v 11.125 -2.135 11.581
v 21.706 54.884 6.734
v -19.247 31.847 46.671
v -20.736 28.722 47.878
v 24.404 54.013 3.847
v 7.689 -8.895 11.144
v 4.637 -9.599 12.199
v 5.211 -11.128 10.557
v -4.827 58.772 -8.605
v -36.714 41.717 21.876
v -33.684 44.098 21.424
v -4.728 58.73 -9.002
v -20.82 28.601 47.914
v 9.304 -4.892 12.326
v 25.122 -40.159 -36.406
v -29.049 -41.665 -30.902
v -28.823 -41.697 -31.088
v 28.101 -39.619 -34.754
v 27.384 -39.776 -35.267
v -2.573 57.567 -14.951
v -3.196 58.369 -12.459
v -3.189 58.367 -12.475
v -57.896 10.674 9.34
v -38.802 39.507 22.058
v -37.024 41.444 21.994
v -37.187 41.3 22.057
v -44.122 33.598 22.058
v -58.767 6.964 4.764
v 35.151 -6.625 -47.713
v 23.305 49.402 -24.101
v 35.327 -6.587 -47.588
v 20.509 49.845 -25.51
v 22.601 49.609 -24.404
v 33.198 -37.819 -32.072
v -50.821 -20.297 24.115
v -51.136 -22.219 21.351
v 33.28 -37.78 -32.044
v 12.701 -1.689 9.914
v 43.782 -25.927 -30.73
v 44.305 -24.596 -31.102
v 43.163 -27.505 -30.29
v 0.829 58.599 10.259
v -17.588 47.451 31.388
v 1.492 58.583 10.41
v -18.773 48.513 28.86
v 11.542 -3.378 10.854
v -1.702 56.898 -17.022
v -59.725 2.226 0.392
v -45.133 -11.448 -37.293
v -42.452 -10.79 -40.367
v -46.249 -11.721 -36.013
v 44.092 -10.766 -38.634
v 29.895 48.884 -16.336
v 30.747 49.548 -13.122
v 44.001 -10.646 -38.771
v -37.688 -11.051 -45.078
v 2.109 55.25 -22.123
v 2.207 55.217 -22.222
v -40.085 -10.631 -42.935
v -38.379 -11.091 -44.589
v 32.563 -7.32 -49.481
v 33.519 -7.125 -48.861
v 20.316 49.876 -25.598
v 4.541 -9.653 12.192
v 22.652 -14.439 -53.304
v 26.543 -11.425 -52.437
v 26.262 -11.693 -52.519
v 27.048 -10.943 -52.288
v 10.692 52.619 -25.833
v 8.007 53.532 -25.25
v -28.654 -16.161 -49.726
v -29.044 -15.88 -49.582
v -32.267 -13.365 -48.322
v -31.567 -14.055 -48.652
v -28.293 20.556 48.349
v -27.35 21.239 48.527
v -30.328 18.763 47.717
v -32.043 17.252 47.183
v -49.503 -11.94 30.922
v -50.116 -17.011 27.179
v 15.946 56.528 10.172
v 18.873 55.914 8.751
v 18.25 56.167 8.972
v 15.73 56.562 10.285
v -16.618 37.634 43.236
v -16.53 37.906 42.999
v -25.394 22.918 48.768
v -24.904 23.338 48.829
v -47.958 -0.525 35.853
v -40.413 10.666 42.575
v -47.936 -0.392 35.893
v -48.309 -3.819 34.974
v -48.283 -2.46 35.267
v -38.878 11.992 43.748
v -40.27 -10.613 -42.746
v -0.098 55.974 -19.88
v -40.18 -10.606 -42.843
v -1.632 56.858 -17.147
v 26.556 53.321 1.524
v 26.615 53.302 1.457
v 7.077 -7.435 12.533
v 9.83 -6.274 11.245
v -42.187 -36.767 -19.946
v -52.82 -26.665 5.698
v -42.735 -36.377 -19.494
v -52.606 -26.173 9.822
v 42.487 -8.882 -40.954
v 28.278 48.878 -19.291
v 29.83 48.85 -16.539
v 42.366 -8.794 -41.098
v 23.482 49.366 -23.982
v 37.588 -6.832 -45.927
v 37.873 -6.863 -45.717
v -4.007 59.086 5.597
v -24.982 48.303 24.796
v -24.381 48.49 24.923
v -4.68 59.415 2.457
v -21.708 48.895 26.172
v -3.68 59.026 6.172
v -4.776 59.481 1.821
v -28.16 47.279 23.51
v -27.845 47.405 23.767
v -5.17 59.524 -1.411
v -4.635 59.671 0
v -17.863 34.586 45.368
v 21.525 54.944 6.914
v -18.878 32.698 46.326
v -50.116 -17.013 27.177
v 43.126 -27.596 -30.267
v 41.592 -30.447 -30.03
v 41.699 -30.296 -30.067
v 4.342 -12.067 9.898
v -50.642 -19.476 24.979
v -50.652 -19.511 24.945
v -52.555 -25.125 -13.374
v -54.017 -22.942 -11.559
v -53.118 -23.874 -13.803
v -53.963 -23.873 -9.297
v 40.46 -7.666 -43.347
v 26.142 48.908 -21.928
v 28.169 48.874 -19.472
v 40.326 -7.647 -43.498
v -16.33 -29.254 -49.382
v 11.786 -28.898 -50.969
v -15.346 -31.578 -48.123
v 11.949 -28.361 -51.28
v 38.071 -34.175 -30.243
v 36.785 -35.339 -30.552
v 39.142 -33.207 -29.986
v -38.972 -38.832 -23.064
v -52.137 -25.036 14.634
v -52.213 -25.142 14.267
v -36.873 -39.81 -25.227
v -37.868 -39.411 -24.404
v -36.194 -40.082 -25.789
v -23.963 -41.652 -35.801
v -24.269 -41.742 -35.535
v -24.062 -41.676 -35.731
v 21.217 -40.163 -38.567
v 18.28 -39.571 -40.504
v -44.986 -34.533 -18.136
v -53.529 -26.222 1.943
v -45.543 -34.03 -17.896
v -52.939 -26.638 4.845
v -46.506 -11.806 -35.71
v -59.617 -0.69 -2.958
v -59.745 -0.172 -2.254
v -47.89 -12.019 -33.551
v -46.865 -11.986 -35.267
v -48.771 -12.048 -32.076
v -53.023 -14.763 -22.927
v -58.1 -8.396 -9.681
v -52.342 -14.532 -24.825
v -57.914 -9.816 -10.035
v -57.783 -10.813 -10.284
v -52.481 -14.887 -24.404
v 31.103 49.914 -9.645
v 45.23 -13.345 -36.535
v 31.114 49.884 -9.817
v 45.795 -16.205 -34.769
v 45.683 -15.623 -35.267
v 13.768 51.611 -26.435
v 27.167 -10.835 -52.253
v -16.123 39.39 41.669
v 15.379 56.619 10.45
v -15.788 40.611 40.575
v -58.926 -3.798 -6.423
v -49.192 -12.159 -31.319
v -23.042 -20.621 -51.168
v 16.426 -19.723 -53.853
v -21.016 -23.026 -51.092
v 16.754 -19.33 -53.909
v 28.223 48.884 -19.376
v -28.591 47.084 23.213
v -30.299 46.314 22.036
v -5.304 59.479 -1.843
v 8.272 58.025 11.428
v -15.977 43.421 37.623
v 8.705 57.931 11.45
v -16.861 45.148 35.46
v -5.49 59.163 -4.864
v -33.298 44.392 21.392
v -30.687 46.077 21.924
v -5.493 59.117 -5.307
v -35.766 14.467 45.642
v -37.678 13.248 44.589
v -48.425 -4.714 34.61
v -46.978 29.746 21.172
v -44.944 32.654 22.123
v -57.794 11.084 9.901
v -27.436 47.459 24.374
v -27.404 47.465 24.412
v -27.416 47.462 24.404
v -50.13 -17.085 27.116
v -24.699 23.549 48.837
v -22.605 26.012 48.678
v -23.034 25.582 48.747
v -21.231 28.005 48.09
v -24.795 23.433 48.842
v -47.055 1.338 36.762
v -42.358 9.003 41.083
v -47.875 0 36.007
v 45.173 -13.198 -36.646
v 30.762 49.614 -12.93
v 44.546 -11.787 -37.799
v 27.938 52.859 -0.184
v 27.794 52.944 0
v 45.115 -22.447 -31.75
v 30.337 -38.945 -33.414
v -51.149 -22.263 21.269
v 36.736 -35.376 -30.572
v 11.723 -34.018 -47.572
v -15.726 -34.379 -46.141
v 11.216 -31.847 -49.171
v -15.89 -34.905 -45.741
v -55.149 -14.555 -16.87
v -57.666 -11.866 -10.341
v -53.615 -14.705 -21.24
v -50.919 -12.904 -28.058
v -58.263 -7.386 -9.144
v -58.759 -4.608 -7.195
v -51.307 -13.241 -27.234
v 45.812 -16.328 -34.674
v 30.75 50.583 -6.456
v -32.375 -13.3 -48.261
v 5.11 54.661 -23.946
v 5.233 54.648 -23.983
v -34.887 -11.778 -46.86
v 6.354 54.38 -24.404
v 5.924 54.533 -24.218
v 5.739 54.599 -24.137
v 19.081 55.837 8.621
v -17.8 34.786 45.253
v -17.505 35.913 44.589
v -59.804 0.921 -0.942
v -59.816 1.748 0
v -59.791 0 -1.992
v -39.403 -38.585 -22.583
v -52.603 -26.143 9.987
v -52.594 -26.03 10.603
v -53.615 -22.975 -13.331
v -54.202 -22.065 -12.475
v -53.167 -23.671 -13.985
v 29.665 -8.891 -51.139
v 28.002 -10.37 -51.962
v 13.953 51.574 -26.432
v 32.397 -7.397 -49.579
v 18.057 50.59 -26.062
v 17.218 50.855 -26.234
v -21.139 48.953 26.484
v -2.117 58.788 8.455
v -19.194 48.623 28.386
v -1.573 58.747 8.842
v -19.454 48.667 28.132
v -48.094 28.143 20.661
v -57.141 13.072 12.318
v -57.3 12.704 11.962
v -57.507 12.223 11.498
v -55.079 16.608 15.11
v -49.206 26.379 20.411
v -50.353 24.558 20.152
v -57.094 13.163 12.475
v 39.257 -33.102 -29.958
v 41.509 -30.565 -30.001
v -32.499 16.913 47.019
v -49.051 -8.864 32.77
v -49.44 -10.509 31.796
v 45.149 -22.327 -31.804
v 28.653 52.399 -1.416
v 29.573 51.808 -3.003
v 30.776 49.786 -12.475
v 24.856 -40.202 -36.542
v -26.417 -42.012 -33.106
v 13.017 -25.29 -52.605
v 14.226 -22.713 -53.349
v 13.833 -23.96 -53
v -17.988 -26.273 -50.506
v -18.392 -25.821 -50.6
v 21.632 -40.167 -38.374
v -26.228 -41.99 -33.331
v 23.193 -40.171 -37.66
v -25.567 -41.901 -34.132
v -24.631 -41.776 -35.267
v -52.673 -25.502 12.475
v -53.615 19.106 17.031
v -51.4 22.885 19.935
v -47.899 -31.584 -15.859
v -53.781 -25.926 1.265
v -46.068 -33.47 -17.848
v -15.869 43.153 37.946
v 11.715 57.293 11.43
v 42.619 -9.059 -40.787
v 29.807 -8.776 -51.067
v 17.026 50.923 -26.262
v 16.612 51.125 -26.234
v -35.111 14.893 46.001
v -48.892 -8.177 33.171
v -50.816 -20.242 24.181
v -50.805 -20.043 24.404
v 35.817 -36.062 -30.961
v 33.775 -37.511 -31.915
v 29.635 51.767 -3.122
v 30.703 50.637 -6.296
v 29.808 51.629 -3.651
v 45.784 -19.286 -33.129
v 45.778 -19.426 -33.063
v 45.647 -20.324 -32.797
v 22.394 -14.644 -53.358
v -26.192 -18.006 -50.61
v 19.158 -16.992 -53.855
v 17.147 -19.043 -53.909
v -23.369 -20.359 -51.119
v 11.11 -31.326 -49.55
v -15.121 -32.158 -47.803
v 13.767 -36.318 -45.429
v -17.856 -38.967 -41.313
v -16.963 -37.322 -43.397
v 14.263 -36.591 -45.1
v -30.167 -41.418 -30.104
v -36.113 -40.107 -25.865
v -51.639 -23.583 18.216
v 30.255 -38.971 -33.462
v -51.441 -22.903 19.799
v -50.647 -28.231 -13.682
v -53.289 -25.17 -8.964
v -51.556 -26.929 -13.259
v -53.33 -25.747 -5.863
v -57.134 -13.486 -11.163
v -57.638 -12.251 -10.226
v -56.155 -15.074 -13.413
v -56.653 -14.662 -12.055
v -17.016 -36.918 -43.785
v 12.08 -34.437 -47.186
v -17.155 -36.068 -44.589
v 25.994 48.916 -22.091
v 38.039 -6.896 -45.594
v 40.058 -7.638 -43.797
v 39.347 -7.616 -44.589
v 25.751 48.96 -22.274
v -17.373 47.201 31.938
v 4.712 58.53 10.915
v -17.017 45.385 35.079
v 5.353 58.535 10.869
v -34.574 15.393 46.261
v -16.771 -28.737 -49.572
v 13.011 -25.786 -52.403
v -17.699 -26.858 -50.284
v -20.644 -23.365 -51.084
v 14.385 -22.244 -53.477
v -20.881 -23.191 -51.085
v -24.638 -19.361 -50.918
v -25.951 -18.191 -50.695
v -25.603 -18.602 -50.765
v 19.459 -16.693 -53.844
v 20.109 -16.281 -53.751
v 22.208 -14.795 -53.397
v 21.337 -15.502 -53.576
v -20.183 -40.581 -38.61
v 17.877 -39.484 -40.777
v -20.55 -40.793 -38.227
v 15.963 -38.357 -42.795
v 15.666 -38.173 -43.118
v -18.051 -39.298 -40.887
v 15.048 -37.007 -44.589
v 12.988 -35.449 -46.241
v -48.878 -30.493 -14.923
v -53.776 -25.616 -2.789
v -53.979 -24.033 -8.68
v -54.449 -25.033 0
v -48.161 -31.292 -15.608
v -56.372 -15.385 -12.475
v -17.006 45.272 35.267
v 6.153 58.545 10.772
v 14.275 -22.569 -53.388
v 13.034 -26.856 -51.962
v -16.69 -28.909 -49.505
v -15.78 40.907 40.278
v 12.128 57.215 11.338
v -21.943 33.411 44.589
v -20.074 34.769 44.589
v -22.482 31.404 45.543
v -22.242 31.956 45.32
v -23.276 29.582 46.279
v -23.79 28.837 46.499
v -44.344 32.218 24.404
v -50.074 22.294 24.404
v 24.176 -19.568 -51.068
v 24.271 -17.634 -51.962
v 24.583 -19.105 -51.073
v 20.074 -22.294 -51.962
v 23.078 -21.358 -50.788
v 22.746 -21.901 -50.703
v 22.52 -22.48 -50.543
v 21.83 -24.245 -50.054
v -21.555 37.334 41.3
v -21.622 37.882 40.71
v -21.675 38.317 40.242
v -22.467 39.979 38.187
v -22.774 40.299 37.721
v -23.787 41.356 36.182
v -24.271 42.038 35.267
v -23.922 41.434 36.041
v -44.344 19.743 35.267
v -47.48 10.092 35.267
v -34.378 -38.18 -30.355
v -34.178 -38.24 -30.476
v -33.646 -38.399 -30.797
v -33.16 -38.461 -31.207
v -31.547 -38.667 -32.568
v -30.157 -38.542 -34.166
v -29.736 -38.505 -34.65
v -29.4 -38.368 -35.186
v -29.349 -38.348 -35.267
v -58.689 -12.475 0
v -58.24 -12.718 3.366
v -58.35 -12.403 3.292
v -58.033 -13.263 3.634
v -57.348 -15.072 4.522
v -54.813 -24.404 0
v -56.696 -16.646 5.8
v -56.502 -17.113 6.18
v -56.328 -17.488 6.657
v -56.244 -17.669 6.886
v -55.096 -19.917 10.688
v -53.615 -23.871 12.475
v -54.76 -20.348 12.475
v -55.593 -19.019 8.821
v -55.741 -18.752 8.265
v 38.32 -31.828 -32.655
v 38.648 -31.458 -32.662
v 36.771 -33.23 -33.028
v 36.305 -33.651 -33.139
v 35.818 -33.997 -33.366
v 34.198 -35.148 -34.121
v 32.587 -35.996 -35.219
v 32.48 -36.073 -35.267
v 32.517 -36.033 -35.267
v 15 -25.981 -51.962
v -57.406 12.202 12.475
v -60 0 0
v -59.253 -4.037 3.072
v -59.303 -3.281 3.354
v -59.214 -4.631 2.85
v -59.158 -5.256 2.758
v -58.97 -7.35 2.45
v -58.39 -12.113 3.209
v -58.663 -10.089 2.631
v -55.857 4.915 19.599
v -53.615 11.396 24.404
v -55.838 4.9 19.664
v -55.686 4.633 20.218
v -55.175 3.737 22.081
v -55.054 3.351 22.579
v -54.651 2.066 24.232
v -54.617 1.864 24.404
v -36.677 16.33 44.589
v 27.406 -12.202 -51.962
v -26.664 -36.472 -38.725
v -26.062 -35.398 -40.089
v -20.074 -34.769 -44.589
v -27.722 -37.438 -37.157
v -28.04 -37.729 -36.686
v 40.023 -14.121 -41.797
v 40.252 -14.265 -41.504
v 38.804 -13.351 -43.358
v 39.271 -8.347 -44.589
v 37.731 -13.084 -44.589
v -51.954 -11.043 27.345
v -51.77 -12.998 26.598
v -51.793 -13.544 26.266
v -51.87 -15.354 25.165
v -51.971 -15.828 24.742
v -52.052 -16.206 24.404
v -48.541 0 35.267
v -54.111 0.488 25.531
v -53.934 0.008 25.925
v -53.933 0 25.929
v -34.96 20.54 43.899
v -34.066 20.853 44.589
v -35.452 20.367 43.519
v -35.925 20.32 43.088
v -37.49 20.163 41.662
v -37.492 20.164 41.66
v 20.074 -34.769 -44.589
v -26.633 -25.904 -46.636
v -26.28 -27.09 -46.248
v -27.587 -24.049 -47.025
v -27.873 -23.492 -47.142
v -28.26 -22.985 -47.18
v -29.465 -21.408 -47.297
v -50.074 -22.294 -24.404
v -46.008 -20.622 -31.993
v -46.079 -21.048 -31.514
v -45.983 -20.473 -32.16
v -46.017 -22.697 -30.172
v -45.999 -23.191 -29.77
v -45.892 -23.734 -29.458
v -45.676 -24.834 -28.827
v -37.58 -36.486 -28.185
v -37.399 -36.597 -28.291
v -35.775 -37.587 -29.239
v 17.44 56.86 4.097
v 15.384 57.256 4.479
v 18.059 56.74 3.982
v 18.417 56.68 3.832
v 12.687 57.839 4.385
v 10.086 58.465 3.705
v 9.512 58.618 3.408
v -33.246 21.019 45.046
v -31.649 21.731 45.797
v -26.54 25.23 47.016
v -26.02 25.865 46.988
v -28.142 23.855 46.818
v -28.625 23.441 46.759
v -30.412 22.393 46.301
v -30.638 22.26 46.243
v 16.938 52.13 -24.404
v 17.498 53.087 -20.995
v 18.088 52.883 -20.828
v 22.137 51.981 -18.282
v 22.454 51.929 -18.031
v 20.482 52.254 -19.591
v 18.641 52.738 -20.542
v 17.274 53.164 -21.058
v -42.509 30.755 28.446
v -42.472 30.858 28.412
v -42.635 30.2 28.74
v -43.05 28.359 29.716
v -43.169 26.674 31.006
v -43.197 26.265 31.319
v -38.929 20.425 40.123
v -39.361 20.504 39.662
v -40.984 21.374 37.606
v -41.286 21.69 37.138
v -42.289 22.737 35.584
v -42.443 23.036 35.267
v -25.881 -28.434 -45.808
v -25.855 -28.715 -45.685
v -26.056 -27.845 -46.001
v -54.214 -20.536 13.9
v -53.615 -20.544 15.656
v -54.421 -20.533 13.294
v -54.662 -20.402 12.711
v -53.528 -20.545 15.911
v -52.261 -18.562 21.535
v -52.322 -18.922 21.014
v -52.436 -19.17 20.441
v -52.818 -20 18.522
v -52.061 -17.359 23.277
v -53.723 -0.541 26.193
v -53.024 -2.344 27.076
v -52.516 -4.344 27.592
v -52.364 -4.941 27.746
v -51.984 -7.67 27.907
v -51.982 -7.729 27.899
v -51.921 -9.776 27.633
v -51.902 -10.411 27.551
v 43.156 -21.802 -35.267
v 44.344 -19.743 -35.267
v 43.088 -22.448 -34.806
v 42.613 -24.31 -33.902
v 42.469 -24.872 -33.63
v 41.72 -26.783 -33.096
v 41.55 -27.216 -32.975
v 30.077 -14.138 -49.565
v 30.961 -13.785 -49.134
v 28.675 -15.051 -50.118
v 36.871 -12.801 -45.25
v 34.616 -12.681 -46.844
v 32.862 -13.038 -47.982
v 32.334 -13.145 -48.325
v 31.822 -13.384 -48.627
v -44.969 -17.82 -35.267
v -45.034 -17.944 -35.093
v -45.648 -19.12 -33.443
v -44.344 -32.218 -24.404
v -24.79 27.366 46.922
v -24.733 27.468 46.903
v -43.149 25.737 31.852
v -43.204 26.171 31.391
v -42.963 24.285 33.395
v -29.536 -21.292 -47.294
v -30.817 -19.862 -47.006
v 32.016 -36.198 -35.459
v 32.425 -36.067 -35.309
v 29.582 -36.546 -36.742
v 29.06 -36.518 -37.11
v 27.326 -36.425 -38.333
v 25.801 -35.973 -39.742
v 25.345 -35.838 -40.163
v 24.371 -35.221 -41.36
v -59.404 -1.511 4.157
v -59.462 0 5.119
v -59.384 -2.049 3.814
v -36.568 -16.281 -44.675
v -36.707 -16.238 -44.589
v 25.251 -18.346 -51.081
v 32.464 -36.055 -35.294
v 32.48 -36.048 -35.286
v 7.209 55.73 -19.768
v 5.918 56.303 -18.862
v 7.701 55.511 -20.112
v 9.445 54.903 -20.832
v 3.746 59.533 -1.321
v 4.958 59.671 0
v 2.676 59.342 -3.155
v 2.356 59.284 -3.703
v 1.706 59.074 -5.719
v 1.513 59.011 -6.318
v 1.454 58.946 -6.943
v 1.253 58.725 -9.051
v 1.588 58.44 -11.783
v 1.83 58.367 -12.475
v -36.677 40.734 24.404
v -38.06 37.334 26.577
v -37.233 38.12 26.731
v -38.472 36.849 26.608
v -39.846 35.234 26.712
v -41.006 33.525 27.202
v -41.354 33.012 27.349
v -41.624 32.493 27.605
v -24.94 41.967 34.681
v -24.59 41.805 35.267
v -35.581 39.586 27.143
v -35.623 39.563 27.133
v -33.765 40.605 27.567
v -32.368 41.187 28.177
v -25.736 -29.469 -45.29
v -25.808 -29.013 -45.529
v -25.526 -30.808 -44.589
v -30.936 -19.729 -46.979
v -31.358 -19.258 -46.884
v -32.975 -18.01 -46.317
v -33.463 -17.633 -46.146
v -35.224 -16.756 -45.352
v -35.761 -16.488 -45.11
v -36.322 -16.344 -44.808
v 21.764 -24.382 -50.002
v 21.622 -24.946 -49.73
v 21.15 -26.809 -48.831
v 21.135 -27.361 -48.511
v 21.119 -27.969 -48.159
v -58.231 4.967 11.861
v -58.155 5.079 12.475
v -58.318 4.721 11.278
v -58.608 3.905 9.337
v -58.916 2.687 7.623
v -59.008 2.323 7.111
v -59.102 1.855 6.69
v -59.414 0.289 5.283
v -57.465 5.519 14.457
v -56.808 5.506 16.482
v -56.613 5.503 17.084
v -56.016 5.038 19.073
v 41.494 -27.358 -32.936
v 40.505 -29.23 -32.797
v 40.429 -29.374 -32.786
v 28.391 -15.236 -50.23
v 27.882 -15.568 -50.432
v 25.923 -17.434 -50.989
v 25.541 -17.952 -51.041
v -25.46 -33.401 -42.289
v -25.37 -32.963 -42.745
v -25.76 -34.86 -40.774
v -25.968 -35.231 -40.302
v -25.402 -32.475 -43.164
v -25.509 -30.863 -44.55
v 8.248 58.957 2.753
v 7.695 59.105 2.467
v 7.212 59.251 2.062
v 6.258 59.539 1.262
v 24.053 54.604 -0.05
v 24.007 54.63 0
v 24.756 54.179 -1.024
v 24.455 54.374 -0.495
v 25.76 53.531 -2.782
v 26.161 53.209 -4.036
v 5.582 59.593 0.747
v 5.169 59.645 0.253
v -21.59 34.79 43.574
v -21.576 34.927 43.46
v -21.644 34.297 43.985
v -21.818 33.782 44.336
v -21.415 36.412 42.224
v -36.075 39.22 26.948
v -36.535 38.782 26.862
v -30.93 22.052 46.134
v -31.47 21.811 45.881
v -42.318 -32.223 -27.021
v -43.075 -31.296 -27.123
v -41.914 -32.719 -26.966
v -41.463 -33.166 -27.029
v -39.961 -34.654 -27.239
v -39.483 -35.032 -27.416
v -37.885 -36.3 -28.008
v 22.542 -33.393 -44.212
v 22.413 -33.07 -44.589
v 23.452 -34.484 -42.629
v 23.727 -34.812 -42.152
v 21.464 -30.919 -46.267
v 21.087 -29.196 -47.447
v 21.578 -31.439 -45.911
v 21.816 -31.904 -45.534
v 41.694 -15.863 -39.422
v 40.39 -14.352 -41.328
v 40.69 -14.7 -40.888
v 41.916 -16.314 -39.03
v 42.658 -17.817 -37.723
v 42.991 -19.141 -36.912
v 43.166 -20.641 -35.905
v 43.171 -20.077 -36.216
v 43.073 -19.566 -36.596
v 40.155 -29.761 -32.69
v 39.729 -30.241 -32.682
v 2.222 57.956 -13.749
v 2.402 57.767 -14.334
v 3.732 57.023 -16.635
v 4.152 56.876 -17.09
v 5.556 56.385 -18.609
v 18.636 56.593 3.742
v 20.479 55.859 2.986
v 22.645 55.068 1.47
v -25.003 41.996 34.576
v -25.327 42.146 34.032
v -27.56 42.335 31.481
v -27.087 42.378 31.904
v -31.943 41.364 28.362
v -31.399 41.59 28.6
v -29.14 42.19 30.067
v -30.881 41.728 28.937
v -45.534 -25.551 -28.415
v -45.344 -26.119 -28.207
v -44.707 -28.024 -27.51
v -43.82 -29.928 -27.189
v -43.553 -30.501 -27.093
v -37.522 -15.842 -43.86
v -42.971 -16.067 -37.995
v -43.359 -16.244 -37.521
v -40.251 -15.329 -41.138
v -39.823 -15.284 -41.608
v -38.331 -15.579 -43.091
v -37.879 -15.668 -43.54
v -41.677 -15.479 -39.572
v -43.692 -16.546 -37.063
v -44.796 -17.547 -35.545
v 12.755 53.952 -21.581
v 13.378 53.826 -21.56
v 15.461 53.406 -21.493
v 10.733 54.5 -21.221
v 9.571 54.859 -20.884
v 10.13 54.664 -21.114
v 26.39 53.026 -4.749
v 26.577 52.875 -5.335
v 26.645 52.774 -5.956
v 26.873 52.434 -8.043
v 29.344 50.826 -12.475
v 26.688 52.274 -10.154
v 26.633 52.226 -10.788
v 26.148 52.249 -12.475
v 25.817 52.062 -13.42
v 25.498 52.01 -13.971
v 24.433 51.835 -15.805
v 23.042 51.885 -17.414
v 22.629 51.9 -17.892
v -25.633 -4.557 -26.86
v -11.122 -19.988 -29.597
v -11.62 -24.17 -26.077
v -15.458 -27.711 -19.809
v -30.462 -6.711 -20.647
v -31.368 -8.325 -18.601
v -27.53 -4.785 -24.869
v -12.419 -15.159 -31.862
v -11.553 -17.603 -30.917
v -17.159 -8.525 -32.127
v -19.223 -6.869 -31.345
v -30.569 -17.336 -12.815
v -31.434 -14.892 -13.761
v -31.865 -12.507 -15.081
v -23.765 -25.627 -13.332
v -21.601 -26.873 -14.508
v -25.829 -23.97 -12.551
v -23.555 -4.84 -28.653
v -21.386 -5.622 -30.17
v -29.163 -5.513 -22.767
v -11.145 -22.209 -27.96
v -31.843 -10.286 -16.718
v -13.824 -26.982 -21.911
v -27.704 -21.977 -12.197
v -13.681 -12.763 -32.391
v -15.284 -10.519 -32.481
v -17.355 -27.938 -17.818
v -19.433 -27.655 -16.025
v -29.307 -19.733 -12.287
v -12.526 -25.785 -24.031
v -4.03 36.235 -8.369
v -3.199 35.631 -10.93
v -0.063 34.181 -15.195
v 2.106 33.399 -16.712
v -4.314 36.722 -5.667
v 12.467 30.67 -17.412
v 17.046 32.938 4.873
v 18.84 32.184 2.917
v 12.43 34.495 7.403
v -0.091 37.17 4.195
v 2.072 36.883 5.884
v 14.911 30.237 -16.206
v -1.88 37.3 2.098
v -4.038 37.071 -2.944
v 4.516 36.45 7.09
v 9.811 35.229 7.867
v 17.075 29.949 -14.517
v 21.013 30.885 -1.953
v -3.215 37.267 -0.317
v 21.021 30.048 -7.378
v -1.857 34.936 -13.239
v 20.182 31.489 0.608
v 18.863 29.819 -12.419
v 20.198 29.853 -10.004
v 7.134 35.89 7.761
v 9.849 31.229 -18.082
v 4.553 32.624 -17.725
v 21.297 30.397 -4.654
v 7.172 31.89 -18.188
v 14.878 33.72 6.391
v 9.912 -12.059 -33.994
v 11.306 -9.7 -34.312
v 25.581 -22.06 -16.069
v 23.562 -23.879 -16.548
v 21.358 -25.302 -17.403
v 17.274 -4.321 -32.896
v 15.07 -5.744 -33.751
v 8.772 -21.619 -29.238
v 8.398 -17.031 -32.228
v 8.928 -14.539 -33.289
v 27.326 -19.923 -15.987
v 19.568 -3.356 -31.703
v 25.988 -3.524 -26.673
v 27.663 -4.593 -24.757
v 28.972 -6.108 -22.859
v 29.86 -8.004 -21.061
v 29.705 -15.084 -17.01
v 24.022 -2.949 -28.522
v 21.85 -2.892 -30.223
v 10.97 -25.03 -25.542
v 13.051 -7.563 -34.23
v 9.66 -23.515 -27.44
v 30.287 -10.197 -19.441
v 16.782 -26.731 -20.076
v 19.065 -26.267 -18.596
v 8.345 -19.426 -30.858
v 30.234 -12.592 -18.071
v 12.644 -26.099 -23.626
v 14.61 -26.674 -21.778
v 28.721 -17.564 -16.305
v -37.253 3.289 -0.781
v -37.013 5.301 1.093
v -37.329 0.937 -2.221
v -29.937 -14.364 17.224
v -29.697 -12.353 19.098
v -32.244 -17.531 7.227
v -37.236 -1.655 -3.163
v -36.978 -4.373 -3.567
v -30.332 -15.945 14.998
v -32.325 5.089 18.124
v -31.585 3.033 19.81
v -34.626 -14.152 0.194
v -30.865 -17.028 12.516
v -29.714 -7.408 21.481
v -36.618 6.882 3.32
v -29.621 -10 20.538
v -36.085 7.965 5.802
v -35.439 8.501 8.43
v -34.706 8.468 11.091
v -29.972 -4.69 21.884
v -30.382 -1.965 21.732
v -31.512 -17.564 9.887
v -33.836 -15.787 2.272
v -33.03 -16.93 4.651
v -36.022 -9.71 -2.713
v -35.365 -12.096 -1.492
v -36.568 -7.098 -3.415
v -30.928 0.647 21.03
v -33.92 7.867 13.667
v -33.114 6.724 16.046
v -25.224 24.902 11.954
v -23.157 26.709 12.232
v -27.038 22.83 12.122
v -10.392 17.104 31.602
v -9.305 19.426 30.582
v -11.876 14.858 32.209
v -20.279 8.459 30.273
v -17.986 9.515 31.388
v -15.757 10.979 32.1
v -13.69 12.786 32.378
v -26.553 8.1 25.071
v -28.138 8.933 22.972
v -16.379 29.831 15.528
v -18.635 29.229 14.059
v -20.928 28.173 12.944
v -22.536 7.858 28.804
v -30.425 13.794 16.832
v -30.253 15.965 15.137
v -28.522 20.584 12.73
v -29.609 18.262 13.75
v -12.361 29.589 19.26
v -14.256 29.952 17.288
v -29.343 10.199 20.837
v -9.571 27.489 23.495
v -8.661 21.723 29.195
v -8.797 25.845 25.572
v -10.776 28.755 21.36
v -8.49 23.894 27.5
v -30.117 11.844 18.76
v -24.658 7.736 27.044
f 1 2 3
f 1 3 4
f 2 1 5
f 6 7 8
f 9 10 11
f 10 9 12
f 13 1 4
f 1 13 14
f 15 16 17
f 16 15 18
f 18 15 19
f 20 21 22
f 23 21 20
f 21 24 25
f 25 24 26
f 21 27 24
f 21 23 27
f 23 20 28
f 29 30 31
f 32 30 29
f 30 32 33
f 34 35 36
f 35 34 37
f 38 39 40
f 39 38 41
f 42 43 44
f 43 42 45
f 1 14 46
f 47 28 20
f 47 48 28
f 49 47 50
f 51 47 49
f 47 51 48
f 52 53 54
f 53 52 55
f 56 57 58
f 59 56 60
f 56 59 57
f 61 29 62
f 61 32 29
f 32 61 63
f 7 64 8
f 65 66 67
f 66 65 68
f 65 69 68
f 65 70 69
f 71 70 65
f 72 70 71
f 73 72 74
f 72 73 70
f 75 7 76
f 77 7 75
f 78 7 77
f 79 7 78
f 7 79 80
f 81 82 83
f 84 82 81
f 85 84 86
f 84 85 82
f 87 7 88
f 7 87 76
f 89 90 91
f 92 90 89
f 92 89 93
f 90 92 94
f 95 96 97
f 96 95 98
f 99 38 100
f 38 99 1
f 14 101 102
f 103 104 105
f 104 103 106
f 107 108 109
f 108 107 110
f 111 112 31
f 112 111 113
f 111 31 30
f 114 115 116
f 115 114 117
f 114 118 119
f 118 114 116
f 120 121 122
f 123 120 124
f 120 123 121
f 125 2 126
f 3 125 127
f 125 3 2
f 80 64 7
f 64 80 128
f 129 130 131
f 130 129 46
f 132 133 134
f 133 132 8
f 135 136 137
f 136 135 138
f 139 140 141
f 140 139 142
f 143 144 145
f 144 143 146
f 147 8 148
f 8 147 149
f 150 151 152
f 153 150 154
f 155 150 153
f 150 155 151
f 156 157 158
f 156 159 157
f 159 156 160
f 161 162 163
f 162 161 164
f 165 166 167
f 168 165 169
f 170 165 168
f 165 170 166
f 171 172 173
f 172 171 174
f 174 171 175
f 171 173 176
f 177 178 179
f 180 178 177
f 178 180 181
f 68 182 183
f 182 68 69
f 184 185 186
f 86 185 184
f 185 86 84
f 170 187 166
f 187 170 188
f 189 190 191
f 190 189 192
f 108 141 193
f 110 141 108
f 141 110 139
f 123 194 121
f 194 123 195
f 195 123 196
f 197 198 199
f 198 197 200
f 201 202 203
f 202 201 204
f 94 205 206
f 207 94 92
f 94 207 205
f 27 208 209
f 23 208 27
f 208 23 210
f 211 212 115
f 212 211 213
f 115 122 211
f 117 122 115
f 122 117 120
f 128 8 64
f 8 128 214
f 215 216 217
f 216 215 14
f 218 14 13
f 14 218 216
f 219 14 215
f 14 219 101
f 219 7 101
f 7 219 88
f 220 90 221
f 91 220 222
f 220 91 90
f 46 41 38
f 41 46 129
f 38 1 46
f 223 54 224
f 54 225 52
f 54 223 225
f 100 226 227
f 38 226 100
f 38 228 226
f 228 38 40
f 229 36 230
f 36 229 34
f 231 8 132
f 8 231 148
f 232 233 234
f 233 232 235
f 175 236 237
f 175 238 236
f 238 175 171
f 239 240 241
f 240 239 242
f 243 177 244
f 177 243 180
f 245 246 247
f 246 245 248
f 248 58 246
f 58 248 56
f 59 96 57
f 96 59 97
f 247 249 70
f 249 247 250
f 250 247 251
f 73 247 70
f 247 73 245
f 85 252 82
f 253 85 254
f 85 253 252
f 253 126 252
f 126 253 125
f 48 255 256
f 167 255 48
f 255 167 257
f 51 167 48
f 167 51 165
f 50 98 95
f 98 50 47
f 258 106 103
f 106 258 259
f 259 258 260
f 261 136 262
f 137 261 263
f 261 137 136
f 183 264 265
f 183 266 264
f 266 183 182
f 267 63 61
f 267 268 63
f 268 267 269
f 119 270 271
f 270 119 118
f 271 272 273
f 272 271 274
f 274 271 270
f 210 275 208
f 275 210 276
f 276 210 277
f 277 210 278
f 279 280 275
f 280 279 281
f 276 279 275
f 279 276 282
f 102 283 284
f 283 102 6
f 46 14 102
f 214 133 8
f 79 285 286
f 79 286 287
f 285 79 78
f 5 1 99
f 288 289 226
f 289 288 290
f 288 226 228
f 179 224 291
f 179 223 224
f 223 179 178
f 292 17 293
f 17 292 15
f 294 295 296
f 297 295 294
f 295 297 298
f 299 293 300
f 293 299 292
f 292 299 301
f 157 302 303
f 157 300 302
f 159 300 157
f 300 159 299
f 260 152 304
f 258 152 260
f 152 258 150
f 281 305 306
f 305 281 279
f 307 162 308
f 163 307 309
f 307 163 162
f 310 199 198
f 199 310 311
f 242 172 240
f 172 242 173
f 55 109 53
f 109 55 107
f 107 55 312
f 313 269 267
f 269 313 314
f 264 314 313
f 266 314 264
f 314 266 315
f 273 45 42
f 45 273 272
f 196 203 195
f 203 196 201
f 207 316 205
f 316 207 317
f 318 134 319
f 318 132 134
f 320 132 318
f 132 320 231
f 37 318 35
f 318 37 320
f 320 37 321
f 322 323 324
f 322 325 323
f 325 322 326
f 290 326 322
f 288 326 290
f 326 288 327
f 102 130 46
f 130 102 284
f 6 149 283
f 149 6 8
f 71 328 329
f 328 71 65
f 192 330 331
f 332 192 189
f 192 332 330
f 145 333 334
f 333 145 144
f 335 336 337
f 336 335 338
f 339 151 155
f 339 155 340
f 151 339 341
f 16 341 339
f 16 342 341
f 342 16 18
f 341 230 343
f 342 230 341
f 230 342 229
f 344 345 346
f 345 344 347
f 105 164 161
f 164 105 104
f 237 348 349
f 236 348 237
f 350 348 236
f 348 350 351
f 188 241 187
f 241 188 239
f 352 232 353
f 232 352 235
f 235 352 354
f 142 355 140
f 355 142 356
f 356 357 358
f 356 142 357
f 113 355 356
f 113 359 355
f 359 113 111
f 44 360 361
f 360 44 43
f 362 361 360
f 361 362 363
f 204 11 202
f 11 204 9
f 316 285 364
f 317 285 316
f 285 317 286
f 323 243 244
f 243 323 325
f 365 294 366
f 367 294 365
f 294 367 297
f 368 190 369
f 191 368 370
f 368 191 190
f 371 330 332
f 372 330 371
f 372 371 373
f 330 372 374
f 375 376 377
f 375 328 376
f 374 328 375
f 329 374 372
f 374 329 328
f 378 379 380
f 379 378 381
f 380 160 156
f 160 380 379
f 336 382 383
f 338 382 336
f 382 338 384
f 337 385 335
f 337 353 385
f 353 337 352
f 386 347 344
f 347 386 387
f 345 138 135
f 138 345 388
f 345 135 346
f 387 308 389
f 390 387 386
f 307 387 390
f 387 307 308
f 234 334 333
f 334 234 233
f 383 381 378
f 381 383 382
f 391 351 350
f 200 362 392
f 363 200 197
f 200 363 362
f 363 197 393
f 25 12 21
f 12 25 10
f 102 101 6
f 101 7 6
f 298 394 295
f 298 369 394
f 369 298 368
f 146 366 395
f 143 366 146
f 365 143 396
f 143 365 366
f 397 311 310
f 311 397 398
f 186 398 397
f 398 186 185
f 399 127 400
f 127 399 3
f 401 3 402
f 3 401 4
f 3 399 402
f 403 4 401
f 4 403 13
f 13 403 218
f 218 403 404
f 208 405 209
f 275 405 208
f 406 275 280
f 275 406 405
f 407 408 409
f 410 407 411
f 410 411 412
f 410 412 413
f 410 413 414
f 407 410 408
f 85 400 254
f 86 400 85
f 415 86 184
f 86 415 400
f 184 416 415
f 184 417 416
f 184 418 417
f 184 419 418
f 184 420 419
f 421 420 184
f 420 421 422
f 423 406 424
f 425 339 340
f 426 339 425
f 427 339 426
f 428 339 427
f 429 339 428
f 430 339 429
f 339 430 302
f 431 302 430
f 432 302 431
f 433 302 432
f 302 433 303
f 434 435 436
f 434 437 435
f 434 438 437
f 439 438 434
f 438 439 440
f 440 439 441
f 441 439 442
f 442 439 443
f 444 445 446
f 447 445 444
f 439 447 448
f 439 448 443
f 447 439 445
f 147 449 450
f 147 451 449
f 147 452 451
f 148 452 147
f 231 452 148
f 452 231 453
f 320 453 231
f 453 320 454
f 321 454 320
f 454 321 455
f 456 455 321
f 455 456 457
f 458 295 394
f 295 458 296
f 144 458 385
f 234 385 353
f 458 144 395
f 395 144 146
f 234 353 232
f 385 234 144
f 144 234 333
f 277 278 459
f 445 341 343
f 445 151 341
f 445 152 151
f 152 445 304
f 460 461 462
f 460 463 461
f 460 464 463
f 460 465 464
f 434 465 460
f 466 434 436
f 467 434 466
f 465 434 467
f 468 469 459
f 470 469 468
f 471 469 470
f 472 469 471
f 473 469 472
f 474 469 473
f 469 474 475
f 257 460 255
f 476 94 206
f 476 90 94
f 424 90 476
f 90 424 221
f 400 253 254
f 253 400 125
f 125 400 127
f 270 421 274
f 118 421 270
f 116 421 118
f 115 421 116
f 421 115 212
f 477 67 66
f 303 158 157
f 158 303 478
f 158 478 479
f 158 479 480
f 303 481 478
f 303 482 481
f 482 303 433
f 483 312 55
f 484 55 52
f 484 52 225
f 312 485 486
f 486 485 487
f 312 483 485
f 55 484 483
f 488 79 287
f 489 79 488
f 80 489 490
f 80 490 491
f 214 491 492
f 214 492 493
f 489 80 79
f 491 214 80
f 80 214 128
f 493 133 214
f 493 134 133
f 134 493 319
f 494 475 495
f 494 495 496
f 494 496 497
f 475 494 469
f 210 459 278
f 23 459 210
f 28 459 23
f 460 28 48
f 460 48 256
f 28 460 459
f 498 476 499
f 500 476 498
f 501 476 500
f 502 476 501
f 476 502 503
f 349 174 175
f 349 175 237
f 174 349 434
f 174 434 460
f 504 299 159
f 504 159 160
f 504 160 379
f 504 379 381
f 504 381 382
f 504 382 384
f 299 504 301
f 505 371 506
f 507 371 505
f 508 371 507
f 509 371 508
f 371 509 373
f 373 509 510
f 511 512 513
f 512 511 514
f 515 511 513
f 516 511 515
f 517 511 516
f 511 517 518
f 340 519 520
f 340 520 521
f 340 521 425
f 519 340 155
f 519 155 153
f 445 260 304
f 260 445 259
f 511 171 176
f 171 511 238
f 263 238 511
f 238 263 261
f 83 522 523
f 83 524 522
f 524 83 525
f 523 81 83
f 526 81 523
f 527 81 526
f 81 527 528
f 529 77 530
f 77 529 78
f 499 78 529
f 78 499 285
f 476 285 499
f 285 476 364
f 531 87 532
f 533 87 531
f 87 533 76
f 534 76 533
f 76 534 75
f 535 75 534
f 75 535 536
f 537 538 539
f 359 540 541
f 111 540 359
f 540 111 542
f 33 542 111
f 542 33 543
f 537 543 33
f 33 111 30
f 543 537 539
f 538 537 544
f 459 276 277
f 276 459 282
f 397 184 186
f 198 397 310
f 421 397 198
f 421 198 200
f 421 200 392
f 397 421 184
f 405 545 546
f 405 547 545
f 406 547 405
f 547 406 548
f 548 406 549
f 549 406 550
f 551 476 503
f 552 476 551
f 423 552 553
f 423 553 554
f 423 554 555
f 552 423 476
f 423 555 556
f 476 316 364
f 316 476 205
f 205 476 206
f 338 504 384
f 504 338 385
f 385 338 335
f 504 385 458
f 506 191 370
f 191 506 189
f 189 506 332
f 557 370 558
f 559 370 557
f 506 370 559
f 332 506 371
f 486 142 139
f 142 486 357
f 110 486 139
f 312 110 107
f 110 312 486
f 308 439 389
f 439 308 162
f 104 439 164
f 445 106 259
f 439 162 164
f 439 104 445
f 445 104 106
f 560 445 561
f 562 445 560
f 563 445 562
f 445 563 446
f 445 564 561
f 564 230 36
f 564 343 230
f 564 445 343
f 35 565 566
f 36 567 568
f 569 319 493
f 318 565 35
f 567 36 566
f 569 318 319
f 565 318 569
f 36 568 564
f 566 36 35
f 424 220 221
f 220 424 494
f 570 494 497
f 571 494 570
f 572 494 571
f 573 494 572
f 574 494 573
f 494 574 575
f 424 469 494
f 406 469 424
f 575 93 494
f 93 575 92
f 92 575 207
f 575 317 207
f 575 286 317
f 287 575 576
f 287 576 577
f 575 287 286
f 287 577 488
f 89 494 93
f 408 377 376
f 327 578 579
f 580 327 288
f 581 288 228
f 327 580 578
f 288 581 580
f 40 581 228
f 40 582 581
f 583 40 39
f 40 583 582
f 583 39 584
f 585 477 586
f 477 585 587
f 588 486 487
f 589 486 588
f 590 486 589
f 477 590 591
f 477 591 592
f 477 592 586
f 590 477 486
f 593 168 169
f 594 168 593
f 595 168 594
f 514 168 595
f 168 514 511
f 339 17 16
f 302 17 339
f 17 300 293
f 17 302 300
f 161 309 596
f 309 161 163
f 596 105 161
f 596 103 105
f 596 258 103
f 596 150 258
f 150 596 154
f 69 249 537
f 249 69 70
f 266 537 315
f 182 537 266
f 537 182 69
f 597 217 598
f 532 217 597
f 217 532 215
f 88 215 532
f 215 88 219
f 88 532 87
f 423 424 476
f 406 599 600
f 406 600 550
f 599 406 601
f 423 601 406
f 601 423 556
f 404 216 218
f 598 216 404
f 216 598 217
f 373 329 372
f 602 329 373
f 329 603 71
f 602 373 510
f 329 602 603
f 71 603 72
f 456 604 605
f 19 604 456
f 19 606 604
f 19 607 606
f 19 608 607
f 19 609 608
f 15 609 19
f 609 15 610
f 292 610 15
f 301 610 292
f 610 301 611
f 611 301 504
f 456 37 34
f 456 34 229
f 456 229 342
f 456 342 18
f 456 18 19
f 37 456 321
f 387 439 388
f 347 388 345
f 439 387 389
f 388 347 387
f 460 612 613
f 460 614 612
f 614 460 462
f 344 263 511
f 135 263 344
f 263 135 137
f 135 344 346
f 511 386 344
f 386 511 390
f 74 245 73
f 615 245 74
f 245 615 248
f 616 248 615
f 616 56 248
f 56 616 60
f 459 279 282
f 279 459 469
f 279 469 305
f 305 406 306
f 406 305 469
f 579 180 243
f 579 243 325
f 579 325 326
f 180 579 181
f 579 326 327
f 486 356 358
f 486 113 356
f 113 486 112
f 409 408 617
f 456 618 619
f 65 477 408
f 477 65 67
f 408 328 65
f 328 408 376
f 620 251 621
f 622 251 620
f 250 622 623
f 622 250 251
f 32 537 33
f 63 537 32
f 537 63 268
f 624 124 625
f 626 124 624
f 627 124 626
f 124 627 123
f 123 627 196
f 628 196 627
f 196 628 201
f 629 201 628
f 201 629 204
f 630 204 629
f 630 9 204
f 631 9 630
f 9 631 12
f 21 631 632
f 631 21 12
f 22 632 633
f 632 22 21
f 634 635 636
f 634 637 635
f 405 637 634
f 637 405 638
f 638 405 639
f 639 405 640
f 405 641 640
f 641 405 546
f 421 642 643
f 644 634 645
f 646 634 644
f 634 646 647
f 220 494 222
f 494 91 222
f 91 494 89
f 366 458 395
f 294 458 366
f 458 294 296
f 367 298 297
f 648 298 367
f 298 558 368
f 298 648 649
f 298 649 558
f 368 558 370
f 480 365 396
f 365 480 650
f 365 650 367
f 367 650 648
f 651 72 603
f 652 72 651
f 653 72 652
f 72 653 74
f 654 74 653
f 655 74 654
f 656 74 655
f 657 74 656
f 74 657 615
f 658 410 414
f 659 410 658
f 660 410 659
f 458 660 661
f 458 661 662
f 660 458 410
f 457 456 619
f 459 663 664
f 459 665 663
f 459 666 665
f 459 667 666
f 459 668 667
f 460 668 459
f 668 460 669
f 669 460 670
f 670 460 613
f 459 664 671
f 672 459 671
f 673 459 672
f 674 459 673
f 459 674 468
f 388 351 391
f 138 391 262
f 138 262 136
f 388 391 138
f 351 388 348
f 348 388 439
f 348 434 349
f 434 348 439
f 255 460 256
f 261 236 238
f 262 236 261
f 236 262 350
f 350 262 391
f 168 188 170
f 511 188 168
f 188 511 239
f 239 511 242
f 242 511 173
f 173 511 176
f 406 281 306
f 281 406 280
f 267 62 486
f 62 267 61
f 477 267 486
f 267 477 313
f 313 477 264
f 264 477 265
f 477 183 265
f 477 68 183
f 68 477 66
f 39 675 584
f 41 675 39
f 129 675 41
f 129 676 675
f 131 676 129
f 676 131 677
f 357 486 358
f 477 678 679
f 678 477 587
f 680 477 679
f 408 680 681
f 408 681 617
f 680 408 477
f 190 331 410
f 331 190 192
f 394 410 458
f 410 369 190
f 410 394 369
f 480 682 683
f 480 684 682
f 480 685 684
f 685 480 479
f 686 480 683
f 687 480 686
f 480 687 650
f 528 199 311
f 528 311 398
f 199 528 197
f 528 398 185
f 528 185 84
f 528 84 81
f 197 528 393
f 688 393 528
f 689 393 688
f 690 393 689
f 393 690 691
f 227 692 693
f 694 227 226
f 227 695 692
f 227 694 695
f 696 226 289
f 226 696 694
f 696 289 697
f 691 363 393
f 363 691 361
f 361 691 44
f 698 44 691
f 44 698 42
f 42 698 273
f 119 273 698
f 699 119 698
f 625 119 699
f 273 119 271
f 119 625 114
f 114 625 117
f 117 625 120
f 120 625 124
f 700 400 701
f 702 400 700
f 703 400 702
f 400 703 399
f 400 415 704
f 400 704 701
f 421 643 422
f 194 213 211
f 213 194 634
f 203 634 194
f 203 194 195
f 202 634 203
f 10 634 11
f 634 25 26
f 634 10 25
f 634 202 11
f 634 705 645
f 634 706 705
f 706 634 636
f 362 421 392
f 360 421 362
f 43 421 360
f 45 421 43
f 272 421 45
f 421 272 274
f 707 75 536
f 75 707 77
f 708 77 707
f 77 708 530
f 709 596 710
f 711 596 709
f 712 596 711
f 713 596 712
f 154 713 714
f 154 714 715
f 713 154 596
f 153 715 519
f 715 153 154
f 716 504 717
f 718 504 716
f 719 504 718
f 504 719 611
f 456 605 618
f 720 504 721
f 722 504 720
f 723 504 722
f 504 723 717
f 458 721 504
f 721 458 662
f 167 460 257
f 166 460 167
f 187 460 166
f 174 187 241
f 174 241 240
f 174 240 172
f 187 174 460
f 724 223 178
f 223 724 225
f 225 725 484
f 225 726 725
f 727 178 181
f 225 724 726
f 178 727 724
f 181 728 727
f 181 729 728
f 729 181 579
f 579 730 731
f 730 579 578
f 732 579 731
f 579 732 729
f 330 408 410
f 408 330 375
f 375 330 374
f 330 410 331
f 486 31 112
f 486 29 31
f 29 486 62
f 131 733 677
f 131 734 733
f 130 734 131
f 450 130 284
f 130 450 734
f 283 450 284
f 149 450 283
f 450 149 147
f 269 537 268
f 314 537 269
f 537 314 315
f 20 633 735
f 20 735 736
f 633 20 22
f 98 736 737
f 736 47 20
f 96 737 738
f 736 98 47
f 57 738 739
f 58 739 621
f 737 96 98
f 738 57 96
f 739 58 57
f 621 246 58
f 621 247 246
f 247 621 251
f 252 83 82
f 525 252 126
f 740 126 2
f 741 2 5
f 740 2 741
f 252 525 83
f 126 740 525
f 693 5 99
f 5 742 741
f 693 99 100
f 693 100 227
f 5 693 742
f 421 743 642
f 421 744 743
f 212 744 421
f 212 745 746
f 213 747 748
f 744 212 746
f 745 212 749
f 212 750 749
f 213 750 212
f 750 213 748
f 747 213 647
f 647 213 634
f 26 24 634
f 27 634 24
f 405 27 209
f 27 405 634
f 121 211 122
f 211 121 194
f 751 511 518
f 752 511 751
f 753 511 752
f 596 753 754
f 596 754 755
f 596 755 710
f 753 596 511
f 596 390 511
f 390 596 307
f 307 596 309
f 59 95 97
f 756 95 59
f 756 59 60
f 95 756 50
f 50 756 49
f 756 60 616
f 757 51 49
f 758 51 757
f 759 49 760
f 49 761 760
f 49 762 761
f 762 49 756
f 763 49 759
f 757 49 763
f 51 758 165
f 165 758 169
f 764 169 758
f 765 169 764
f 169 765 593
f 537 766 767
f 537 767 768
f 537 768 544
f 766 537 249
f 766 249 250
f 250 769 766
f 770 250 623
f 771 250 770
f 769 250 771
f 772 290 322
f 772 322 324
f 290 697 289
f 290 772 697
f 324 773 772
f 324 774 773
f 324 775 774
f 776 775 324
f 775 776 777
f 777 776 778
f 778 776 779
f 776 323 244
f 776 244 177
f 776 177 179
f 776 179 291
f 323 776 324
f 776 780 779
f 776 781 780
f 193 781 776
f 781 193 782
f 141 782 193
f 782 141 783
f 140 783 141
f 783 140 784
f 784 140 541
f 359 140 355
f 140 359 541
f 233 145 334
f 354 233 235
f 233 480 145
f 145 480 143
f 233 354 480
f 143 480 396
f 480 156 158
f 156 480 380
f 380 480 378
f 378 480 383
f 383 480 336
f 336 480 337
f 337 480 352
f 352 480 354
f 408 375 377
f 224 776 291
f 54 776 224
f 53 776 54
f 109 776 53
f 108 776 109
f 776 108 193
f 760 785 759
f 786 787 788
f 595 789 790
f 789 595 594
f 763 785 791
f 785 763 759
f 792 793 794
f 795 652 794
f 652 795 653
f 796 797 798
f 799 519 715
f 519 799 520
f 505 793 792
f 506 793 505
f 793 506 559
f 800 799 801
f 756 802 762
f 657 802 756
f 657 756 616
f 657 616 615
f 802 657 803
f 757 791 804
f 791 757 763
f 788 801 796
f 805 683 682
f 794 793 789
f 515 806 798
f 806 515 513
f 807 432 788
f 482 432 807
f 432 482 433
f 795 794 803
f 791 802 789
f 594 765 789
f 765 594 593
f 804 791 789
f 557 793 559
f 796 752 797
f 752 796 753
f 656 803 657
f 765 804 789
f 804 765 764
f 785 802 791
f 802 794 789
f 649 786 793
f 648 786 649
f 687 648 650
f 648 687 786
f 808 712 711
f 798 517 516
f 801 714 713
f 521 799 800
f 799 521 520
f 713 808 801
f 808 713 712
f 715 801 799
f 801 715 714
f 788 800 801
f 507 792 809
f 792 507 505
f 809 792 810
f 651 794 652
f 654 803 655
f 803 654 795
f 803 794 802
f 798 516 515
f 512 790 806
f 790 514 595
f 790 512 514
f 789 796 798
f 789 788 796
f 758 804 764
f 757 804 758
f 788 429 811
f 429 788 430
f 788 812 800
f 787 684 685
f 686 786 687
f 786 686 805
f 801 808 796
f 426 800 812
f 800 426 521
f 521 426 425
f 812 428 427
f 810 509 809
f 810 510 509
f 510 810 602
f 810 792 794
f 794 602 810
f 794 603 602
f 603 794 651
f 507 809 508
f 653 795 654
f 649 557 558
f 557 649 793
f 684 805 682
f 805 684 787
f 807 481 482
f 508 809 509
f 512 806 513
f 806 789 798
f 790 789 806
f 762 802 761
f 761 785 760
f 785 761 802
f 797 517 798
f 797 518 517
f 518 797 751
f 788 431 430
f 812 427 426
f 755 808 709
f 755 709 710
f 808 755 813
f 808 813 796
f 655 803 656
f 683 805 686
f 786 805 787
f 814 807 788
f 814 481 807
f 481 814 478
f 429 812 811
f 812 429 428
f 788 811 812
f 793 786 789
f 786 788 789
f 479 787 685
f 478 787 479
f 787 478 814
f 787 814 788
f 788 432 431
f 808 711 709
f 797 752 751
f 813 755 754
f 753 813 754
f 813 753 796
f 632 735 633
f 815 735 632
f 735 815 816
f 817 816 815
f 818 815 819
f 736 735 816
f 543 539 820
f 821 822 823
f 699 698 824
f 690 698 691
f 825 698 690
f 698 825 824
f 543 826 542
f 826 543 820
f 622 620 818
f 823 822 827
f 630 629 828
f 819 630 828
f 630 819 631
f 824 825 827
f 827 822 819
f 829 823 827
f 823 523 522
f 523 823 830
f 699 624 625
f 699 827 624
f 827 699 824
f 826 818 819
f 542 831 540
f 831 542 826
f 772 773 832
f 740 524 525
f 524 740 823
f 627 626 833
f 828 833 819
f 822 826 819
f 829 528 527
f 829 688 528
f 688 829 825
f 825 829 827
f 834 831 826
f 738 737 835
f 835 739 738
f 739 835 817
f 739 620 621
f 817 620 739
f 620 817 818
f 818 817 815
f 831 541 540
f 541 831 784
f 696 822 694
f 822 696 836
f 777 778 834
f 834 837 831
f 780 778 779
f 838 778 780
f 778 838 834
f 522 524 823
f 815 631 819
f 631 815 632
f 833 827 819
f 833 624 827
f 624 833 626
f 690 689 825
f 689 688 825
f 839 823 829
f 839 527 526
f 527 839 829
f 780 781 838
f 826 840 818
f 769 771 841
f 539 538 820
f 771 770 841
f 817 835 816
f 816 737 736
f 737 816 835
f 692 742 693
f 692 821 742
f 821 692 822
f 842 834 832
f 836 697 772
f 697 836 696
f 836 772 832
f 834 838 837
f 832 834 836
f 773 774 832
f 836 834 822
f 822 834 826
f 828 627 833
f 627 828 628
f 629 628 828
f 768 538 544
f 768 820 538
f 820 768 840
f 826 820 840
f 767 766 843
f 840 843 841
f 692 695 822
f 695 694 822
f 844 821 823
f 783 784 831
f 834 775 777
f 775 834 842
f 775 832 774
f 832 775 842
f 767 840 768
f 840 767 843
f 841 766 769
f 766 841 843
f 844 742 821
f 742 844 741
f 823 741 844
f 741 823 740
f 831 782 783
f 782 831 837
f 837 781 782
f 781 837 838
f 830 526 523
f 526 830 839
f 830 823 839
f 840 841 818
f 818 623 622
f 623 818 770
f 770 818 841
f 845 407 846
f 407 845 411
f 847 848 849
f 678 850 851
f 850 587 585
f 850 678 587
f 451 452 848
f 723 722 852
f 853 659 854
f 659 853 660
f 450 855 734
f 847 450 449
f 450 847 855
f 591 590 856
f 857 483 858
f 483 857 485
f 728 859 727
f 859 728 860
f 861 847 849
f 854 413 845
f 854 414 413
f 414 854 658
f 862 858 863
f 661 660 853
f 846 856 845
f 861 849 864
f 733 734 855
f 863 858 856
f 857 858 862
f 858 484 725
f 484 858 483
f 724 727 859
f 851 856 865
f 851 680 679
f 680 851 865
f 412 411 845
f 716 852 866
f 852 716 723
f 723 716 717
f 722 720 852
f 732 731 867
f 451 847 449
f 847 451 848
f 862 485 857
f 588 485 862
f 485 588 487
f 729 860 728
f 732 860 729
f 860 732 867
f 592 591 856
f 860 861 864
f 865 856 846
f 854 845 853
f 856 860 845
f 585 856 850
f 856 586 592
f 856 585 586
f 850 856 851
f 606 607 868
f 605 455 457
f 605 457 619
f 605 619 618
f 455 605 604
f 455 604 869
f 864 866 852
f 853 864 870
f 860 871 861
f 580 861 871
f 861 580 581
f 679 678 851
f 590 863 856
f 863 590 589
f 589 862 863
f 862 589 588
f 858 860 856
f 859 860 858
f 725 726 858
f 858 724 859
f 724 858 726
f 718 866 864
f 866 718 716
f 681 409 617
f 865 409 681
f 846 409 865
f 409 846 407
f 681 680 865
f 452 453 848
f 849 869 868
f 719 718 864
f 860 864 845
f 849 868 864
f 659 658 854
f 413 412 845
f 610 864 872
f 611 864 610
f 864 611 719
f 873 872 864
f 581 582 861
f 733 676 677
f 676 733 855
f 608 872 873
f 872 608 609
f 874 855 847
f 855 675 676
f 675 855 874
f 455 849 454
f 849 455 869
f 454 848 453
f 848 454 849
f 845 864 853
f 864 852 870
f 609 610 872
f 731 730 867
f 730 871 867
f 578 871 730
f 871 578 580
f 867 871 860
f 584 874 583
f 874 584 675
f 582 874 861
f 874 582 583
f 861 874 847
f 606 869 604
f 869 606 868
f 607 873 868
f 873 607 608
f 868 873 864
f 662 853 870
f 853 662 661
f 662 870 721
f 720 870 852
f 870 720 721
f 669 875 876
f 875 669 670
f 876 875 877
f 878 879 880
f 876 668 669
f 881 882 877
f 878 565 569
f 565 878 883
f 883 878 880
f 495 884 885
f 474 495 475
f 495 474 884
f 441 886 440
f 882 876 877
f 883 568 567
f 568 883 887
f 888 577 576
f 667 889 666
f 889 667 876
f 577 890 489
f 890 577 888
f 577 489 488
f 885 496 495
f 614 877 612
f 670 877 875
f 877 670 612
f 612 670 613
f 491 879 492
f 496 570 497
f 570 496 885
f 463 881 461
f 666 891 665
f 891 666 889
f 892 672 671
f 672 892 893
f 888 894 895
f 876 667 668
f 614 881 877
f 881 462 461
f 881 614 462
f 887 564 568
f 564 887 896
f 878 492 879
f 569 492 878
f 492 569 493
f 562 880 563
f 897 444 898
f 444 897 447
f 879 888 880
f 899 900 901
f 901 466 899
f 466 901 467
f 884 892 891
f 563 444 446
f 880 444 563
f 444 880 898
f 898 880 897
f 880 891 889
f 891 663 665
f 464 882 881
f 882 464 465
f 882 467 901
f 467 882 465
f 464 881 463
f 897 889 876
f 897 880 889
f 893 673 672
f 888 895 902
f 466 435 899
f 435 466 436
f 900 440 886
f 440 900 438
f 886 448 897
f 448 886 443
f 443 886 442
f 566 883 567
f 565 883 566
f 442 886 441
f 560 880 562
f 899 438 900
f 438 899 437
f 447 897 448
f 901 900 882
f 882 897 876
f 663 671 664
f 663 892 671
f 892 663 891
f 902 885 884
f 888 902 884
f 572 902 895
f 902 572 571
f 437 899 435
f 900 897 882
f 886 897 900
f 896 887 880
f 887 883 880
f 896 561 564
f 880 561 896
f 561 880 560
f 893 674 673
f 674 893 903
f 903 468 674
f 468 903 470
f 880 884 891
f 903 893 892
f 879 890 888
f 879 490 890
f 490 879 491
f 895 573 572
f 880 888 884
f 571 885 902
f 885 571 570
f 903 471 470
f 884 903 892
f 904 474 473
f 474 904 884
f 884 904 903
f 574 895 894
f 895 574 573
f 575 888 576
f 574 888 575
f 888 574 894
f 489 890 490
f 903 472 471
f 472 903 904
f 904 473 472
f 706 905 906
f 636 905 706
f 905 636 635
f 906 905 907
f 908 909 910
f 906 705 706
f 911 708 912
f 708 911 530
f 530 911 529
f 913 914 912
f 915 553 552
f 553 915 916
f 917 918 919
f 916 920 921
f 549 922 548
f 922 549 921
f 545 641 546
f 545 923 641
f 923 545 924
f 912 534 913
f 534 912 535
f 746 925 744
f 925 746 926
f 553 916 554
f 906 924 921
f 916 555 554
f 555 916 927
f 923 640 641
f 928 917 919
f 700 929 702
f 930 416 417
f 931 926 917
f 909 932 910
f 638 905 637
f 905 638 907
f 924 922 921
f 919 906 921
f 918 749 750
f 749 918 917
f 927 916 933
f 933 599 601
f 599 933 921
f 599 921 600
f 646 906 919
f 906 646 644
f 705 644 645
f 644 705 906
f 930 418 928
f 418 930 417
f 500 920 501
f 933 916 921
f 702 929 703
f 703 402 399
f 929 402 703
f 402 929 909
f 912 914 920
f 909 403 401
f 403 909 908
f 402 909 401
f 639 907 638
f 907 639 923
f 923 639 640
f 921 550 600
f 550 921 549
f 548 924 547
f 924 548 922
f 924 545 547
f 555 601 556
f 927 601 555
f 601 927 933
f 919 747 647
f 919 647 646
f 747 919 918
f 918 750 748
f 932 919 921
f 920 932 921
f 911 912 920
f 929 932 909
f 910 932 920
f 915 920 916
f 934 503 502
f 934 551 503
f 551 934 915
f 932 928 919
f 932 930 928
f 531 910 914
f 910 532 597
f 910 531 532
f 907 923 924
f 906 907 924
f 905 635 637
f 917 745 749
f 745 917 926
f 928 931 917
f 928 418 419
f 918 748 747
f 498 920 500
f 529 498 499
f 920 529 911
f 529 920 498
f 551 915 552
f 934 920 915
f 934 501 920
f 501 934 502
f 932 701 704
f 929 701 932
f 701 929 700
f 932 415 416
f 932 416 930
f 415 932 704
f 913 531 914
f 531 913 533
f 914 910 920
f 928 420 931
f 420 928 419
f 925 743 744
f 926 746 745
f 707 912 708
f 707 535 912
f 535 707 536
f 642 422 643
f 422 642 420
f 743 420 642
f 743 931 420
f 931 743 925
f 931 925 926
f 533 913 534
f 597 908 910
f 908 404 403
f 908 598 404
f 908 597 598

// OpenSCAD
difference() {
	intersection() {
		hull() {
			rotate(a = -123.3588517168, v = [-0.2833660352, -0.7857063954, 0.0000000000]) {
				rotate(a = -90.0000000000, v = [-0.8660254038, -0.5000000000, 0.0000000000]) {
					cylinder(h = 60, r = 16.2000000000);
				}
			}
			rotate(a = -123.3588517168, v = [-0.2833660352, -0.7857063954, 0.0000000000]) {
				rotate(a = -90.0000000000, v = [0.8660254038, -0.5000000000, 0.0000000000]) {
					cylinder(h = 60, r = 16.2000000000);
				}
			}
			rotate(a = -123.3588517168, v = [-0.2833660352, -0.7857063954, 0.0000000000]) {
				rotate(a = -18.4383929552, v = [-0.2783292144, -0.1502295517, 0.0000000000]) {
					cylinder(h = 60, r = 16.2000000000);
				}
			}
			rotate(a = -123.3588517168, v = [-0.2833660352, -0.7857063954, 0.0000000000]) {
				rotate(a = -149.1684967374, v = [-0.5053058454, -0.0856603985, 0.0000000000]) {
					cylinder(h = 60, r = 16.2000000000);
				}
			}
			rotate(a = -123.3588517168, v = [-0.2833660352, -0.7857063954, 0.0000000000]) {
				rotate(a = -159.6517266695, v = [0.3468424841, 0.0247683702, -0.0000000000]) {
					cylinder(h = 60, r = 16.2000000000);
				}
			}
		}
		sphere(r = 60);
	}
	union() {
		rotate(a = -123.3588517168, v = [-0.2833660352, -0.7857063954, 0.0000000000]) {
			rotate(a = -90.0000000000, v = [-0.8660254038, -0.5000000000, 0.0000000000]) {
				translate(v = [0, 0, 35]) {
					cylinder(h = 100, r = 13.2000000000);
				}
			}
		}
		rotate(a = -123.3588517168, v = [-0.2833660352, -0.7857063954, 0.0000000000]) {
			rotate(a = -90.0000000000, v = [0.8660254038, -0.5000000000, 0.0000000000]) {
				translate(v = [0, 0, 35]) {
					cylinder(h = 100, r = 13.2000000000);
				}
			}
		}
		rotate(a = -123.3588517168, v = [-0.2833660352, -0.7857063954, 0.0000000000]) {
			rotate(a = -18.4383929552, v = [-0.2783292144, -0.1502295517, 0.0000000000]) {
				translate(v = [0, 0, 35]) {
					cylinder(h = 100, r = 13.2000000000);
				}
			}
		}
		rotate(a = -123.3588517168, v = [-0.2833660352, -0.7857063954, 0.0000000000]) {
			rotate(a = -149.1684967374, v = [-0.5053058454, -0.0856603985, 0.0000000000]) {
				translate(v = [0, 0, 35]) {
					cylinder(h = 100, r = 13.2000000000);
				}
			}
		}
		rotate(a = -123.3588517168, v = [-0.2833660352, -0.7857063954, 0.0000000000]) {
			rotate(a = -159.6517266695, v = [0.3468424841, 0.0247683702, -0.0000000000]) {
				translate(v = [0, 0, 35]) {
					cylinder(h = 100, r = 13.2000000000);
				}
			}
		}
	}
}
